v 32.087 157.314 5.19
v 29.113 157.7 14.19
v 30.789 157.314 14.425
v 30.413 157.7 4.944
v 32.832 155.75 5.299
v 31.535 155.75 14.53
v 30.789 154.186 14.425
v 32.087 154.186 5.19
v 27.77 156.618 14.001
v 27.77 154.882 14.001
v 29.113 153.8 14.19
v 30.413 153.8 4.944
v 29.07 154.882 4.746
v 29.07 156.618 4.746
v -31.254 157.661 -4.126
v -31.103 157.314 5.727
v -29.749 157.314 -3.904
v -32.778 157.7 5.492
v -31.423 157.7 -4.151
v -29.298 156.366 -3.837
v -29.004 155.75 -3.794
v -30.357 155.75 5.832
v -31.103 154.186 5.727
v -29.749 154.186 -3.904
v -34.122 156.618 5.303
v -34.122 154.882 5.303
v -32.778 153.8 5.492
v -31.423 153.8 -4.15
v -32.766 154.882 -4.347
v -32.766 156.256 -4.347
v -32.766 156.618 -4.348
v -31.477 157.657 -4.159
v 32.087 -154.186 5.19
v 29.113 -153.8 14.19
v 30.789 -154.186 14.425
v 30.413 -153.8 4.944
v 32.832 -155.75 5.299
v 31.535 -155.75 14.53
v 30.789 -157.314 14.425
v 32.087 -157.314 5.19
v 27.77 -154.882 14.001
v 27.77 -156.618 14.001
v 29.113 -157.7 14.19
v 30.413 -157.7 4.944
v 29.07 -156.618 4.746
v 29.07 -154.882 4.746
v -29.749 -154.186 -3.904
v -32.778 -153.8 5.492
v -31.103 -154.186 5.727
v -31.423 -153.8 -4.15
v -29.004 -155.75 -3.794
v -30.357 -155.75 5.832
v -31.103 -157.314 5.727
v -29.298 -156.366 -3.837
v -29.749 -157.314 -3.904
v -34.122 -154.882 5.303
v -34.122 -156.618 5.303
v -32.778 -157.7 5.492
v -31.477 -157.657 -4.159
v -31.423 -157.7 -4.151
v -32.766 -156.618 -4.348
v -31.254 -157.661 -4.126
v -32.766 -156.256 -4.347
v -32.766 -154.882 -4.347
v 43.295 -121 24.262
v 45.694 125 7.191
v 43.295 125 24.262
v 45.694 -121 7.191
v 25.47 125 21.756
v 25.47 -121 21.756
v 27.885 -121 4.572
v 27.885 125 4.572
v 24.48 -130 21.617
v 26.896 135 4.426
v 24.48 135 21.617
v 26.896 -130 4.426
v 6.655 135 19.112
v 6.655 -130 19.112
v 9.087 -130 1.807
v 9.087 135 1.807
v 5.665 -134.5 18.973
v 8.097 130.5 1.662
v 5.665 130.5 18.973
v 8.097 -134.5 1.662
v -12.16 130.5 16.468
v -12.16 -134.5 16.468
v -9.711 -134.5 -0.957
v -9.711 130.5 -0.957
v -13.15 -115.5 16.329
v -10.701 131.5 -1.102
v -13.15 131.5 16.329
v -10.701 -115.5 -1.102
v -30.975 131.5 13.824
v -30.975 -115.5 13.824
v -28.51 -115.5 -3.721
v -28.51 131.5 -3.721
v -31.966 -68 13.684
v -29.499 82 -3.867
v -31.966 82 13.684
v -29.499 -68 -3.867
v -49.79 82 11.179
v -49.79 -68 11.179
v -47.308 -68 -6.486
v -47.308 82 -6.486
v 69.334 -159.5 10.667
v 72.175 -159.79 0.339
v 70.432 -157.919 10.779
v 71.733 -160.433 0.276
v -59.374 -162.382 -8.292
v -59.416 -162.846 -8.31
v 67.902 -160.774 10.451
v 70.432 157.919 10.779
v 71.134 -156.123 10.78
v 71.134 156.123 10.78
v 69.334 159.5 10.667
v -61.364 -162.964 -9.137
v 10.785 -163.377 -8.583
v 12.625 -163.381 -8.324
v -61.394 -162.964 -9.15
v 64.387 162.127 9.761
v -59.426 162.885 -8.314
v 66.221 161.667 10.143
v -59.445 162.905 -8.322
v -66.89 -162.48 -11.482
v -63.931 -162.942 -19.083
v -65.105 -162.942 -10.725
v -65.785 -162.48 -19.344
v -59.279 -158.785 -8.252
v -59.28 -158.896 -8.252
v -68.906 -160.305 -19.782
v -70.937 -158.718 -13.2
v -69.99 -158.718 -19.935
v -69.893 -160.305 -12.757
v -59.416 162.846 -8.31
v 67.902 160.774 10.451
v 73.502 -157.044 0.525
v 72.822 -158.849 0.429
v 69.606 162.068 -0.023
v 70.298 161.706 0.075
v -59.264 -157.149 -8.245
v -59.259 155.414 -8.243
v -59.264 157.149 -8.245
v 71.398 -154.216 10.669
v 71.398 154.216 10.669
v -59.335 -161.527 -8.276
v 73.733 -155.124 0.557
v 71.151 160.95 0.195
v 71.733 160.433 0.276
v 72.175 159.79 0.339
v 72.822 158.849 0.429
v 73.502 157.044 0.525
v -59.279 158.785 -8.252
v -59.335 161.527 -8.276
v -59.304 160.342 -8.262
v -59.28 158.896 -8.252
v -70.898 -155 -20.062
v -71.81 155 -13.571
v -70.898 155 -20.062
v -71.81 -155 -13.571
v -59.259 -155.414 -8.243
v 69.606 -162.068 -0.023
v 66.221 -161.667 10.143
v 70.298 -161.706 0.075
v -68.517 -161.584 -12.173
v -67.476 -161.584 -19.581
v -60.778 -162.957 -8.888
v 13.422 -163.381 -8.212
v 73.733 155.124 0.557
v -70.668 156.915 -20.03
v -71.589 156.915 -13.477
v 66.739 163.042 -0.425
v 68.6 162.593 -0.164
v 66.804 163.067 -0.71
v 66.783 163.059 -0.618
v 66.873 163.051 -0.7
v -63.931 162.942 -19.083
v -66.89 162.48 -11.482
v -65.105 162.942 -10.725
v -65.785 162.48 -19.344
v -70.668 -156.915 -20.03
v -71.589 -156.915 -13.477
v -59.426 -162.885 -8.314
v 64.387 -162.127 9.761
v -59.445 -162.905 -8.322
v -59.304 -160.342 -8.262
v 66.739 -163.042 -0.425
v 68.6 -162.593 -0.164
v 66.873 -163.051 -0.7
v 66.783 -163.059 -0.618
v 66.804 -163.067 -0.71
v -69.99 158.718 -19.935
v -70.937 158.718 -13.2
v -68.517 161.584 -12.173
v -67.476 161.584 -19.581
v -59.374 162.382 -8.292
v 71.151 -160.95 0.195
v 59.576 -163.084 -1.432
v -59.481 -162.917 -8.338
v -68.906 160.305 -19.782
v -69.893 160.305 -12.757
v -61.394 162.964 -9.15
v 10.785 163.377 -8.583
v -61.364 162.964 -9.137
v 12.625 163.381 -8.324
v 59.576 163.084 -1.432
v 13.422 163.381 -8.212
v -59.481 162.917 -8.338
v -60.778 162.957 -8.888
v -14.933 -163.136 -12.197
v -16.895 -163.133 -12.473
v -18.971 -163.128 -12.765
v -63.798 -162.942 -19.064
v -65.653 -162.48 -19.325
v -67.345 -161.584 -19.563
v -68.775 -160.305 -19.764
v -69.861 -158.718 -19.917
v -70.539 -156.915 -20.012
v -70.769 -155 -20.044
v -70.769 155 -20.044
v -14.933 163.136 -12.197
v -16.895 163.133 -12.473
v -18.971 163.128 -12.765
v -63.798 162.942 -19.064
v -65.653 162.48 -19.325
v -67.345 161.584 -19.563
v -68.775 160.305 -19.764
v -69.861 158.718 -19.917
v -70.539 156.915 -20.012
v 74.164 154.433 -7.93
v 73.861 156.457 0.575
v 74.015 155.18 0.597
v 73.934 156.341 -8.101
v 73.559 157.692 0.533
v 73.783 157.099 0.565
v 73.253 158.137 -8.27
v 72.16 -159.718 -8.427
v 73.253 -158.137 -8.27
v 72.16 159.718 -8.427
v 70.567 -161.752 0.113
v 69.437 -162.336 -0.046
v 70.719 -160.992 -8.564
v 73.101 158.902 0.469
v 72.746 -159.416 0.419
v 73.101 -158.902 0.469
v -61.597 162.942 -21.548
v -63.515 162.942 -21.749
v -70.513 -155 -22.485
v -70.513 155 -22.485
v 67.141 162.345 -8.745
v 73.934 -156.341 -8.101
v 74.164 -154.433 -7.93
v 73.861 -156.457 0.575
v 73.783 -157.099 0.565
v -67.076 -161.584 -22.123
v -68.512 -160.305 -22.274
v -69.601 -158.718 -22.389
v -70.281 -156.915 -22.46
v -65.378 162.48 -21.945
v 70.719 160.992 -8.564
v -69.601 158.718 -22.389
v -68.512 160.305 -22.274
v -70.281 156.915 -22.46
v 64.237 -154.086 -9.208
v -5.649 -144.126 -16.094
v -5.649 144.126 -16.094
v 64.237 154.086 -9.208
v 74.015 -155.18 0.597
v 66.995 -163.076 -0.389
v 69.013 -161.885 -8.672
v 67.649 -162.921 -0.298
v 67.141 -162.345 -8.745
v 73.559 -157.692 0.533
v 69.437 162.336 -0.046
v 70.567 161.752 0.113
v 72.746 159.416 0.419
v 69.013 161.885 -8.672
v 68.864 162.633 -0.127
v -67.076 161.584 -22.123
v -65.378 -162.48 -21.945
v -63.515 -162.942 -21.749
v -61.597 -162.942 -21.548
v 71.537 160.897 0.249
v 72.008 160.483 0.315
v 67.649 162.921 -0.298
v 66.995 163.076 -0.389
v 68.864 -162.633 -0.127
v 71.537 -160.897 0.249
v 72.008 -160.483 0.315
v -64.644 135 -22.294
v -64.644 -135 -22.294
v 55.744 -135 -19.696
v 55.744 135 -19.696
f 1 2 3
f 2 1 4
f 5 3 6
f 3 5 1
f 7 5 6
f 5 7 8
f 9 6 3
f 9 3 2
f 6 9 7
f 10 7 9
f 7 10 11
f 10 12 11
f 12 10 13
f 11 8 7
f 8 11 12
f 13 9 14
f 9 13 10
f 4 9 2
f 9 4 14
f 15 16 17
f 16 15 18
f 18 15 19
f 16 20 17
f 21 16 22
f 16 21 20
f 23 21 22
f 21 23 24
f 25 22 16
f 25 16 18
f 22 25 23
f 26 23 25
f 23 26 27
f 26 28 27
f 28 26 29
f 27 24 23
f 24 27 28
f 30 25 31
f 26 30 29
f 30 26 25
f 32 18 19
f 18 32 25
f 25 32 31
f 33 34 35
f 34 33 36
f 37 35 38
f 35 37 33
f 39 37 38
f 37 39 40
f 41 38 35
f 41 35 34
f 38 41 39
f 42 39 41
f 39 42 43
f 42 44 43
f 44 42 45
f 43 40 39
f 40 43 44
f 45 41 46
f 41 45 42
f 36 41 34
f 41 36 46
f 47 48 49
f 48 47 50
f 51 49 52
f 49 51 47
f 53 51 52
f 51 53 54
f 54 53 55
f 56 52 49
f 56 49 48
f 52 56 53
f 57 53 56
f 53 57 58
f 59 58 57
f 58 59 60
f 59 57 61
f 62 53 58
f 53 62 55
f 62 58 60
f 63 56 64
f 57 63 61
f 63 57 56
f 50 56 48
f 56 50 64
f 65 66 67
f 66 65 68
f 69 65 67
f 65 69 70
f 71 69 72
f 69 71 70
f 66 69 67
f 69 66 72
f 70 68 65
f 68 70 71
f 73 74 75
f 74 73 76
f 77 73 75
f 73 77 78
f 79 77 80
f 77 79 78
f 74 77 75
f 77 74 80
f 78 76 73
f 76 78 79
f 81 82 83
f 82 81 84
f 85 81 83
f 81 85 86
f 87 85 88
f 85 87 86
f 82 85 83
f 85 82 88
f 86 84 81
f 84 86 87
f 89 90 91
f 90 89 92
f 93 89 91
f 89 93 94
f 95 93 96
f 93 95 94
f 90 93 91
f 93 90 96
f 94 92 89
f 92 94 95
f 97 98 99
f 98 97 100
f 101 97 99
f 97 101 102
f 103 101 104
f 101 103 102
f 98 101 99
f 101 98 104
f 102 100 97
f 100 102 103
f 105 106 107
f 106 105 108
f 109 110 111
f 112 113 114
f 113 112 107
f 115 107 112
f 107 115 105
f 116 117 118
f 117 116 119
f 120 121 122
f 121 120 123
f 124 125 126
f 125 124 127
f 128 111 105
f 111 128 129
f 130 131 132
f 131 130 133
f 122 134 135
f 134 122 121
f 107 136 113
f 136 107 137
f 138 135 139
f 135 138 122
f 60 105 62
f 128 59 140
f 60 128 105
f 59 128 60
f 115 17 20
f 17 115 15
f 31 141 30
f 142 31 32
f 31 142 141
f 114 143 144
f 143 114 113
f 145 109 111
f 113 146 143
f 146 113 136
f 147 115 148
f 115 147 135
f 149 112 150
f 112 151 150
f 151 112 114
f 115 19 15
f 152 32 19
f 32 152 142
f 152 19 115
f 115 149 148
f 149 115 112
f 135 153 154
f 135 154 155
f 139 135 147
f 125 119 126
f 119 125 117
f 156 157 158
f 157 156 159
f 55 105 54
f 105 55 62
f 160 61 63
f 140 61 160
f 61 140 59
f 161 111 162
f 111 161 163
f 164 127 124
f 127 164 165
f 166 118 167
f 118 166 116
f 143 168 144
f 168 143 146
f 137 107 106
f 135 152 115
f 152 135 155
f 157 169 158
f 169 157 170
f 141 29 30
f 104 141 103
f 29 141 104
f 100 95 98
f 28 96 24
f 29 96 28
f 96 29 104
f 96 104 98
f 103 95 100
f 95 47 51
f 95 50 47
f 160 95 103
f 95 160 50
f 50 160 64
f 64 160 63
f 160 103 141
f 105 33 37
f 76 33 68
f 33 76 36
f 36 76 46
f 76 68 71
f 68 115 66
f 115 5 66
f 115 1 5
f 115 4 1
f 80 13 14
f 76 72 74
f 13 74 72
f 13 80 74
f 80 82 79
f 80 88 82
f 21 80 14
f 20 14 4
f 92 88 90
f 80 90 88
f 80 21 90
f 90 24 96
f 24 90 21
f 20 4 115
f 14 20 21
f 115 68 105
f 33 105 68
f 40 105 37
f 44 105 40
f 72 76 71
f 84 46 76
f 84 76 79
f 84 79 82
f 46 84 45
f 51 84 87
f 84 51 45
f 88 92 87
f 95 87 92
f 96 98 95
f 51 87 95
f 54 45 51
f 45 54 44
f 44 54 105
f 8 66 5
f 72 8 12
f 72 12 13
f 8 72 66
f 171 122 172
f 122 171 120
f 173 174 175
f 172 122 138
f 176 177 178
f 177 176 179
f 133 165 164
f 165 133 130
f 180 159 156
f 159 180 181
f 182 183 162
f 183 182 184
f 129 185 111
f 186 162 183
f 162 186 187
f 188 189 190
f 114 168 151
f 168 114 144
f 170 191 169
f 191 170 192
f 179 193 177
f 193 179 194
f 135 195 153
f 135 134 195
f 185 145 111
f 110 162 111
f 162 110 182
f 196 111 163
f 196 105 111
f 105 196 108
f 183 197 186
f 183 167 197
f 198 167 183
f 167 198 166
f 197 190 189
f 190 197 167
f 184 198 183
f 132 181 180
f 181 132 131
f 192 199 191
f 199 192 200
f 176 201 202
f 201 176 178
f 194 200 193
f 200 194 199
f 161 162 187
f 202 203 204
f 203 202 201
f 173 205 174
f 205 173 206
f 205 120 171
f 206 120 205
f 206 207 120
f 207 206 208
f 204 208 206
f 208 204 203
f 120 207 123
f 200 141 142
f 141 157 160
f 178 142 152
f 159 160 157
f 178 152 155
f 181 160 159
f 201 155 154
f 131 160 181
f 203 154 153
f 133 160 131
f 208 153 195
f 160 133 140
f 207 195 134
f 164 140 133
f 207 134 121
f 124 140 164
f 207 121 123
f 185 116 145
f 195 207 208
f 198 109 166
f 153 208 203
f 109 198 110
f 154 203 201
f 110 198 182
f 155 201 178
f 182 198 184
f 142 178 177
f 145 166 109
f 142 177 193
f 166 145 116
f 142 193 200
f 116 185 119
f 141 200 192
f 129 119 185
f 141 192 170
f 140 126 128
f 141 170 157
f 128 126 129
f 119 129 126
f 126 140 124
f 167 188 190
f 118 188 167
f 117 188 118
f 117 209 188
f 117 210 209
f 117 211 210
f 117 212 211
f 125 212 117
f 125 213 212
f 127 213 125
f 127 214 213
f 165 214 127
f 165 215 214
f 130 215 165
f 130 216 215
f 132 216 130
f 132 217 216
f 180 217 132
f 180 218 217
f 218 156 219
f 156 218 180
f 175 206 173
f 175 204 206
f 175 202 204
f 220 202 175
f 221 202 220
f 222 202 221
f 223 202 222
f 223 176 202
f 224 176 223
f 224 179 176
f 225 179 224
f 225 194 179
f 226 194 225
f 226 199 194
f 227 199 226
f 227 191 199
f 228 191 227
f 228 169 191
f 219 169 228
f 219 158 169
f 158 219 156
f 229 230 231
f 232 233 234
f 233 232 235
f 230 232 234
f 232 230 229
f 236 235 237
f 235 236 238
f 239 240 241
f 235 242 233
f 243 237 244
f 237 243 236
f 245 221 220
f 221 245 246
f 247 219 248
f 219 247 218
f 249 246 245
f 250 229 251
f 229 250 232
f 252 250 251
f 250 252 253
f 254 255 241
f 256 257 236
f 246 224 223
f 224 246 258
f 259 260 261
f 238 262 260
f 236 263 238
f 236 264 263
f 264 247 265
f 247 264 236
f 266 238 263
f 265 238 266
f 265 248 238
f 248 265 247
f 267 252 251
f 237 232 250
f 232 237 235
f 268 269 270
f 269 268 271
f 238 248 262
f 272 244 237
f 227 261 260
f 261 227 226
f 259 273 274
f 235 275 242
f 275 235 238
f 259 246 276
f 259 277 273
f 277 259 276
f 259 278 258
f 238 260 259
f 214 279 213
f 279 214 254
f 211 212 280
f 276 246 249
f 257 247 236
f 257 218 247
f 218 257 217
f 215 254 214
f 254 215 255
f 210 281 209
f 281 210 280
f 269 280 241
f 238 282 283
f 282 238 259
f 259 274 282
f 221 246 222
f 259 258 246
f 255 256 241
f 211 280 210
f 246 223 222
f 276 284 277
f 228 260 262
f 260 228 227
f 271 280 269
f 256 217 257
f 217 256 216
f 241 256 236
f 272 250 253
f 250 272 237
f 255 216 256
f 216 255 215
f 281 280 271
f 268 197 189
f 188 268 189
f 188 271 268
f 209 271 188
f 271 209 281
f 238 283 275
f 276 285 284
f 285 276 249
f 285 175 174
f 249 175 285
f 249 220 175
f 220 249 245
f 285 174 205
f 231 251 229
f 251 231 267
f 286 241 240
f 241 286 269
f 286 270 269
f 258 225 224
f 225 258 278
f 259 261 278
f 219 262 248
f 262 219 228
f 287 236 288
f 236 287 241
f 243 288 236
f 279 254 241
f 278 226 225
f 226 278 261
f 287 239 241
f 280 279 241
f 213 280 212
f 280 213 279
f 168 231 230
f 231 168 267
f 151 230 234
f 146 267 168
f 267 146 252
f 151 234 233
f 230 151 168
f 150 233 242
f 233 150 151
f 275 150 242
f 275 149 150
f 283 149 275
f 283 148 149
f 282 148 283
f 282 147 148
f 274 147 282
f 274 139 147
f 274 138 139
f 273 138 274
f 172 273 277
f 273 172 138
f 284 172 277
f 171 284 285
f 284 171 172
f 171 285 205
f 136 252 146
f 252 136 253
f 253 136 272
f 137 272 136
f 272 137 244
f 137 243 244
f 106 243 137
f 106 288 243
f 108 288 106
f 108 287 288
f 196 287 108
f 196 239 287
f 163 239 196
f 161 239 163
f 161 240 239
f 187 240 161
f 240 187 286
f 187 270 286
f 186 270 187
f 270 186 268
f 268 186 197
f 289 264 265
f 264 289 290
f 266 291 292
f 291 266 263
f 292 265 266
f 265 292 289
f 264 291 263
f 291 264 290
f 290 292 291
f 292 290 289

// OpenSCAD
//mounting holes separation 62.5mm 311.5mm
//mounting holes to border 12.5mm to top 24mm to bottom
//$fn = 255;

mounting_hole_A = 62.5;
mounting_hole_B = 311.5;
keyboard_length = 318;
keyboard_width = 98.50;

main_angle = 8;

case_width = 130;
case_length = 310;
corner_inclination = 5;

top_case_height = 10;
bottom_case_height = 5;

total_case_height = 20;


complete_case();
translate([0,0,-15.5])rotate([0,-(main_angle-2),0])base();

module complete_case(){
    union(){
        rotate([0,-main_angle,0]){
            keyboard();
            top_case();
            bottom_case();
        }
    }
}

module top_case(){
    translate([0,0,-total_case_height/2])difference(){
        hull(){
            translate([case_width/2,case_length/2,top_case_height/2-4])rotate([corner_inclination,-corner_inclination,0])cylinder(h=top_case_height+8, r = 8, center=true);
            translate([-case_width/2,case_length/2,top_case_height/2])cylinder(h=top_case_height,r = 8, center=true);
            translate([case_width/2,-case_length/2,top_case_height/2-4])rotate([-corner_inclination,-corner_inclination,0])cylinder(h=top_case_height+8,r = 8, center=true);
            translate([-case_width/2,-case_length/2,top_case_height/2])cylinder(h=top_case_height,r = 8, center=true);
        }
        translate([-case_width/2-25,-(case_length+30)/2,top_case_height/2-3])rotate([0,-15,0])cube([40,case_length+30,20]);
        translate([-(case_width+30)/2,-(case_length+30)/2,-total_case_height/2])cube([case_width+30,case_length+30,10]);
    }
}

module bottom_case(){
    translate([0,0,-(bottom_case_height+top_case_height)])rotate([0,2,0])difference(){
        hull(){
            translate([case_width/2,case_length/2,bottom_case_height/2+4])rotate([-corner_inclination,corner_inclination,0])cylinder(h=bottom_case_height+8,r = 8, center=true);
            translate([-case_width/2,case_length/2,bottom_case_height/2])cylinder(h=bottom_case_height,r = 8, center=true);
            translate([case_width/2,-case_length/2,bottom_case_height/2+4])rotate([corner_inclination,corner_inclination,0])cylinder(h=bottom_case_height+8,r = 8, center=true);
            translate([-case_width/2,-case_length/2,bottom_case_height/2])cylinder(h=bottom_case_height,r = 8, center=true);
        }
    translate([-(case_width+30)/2,-(case_length+30)/2,bottom_case_height/2])rotate([0,-2,0])cube([case_width+30,case_length+30,20]);
    }
}

//translate([0,0,-15])cube([case_width+10,case_length,15], center = true);
//translate([-(case_width+30)/2,-(case_length+30)/2,0])rotate([0,-main_angle,0])cube([case_width+30,case_length+30,20]);
//translate([-case_width/2-25,-(case_length+30)/2,-20])rotate([0,-15,0])cube([40,case_length+30,20]);
//linear_extrude(height = 15, scale = 14/17) square([case_width,case_length], center = true);

/*translate([-25,0,0])polyhedron(
    points=[[0,0,0],[17,0,0],[17,17,0],[0,17,0],[1.5,1.5,2],[15.5,1.5,2],[15.5,15.5,2],[1.5,15.5,2]], 
    faces =[[0,1,2,3],[4,5,1,0],[5,6,2,1],[6,7,3,2], [7,4,0,3],[7,6,5,4]]
);

translate([25,0,0])polyhedron(
    points=[[0,0,0],[17,0,0],[17,17,0],[0,17,0],[1.5,1.5,0],[15.5,1.5,0],[15.5,15.5,2],[1.5,15.5,2]], 
    faces =[[0,1,2,3],[4,5,1,0],[5,6,2,1],[6,7,3,2],[7,4,0,3],[7,6,5,4]]
);


polyhedron(
    points=[[17,17,0],[0,17,0],[1.5,1.5,0],[15.5,1.5,0],[15.5,15.5,2],[1.5,15.5,2]], 
    faces =[[0,1,2,3],[4,5,1,0],[0,3,4],[1,2,5],[2,3,4,5]]
);*/


module base(){
    A = case_width/2;
    B = case_length/2;
    base_taper = 20;
    back_taper = 10;
    height = 10;
    color("green")polyhedron(
        points=[
            [A,B,0],[A,-B,0],[-A,-(B-base_taper),0],[-A,B-base_taper,0],//base
            [A-back_taper,-(B-base_taper),-height],[A-back_taper,B-base_taper,-height]
        ], 
        faces =[
            [0,3,2,1],//base
            [0,1,4,5],//back
            [0,5,3],//side
            [1,2,4],//side
            [2,3,5,4]//top
        ]
    );
}
module keyboard(){
    mounting_screws();
    keycaps();
    translate([-keyboard_width/2, -keyboard_length/2, -13])cube([keyboard_width, keyboard_length, 13]);
}

module mounting_screws(){
    height = 10;
    diameter = 4;
    color("MediumSlateBlue"){
        translate([mounting_hole_A/2, mounting_hole_B/2, 0])cylinder(h=height,d=diameter);
        translate([-mounting_hole_A/2, mounting_hole_B/2, 0])cylinder(h=height,d=diameter);
        translate([mounting_hole_A/2, -mounting_hole_B/2, 0])cylinder(h=height,d=diameter);
        translate([-mounting_hole_A/2, -mounting_hole_B/2, 0])cylinder(h=height,d=diameter);
    }
}

module keycaps(){
    d_to_top = 3;
    d_to_bot = 1;
    1U = 18;
    1point5U = 28;
    2U = 36;
    spacebar = 150;
    spacing = 1;
    row_1 = 13*1U + 12*spacing;
    row_2 = 14*1U + 13*spacing;
    row_3 = 12*1U + 2U + 13*spacing;
    row_4 = 2*1point5U + 10*1U + 11*spacing;
    color("Green"){
        translate([keyboard_width/2-d_to_top-1U,-keyboard_length/2 + 38,0])cube([1U,row_1,18]);
        translate([keyboard_width/2-d_to_top-2*1U-spacing,-keyboard_length/2 + 29,0])cube([1U,row_2,18]);
        translate([keyboard_width/2-d_to_top-3*1U-2*spacing,-keyboard_length/2 + 24.5,0])cube([1U,row_3,18]);
        translate([keyboard_width/2-d_to_top-4*1U-3*spacing,-keyboard_length/2 + 43.5,0])cube([1U,row_4,18]);
        translate([keyboard_width/2-d_to_top-5*1U-4*spacing,-keyboard_length/2 + 91,0])cube([1U,spacebar,18]);
    }
}
